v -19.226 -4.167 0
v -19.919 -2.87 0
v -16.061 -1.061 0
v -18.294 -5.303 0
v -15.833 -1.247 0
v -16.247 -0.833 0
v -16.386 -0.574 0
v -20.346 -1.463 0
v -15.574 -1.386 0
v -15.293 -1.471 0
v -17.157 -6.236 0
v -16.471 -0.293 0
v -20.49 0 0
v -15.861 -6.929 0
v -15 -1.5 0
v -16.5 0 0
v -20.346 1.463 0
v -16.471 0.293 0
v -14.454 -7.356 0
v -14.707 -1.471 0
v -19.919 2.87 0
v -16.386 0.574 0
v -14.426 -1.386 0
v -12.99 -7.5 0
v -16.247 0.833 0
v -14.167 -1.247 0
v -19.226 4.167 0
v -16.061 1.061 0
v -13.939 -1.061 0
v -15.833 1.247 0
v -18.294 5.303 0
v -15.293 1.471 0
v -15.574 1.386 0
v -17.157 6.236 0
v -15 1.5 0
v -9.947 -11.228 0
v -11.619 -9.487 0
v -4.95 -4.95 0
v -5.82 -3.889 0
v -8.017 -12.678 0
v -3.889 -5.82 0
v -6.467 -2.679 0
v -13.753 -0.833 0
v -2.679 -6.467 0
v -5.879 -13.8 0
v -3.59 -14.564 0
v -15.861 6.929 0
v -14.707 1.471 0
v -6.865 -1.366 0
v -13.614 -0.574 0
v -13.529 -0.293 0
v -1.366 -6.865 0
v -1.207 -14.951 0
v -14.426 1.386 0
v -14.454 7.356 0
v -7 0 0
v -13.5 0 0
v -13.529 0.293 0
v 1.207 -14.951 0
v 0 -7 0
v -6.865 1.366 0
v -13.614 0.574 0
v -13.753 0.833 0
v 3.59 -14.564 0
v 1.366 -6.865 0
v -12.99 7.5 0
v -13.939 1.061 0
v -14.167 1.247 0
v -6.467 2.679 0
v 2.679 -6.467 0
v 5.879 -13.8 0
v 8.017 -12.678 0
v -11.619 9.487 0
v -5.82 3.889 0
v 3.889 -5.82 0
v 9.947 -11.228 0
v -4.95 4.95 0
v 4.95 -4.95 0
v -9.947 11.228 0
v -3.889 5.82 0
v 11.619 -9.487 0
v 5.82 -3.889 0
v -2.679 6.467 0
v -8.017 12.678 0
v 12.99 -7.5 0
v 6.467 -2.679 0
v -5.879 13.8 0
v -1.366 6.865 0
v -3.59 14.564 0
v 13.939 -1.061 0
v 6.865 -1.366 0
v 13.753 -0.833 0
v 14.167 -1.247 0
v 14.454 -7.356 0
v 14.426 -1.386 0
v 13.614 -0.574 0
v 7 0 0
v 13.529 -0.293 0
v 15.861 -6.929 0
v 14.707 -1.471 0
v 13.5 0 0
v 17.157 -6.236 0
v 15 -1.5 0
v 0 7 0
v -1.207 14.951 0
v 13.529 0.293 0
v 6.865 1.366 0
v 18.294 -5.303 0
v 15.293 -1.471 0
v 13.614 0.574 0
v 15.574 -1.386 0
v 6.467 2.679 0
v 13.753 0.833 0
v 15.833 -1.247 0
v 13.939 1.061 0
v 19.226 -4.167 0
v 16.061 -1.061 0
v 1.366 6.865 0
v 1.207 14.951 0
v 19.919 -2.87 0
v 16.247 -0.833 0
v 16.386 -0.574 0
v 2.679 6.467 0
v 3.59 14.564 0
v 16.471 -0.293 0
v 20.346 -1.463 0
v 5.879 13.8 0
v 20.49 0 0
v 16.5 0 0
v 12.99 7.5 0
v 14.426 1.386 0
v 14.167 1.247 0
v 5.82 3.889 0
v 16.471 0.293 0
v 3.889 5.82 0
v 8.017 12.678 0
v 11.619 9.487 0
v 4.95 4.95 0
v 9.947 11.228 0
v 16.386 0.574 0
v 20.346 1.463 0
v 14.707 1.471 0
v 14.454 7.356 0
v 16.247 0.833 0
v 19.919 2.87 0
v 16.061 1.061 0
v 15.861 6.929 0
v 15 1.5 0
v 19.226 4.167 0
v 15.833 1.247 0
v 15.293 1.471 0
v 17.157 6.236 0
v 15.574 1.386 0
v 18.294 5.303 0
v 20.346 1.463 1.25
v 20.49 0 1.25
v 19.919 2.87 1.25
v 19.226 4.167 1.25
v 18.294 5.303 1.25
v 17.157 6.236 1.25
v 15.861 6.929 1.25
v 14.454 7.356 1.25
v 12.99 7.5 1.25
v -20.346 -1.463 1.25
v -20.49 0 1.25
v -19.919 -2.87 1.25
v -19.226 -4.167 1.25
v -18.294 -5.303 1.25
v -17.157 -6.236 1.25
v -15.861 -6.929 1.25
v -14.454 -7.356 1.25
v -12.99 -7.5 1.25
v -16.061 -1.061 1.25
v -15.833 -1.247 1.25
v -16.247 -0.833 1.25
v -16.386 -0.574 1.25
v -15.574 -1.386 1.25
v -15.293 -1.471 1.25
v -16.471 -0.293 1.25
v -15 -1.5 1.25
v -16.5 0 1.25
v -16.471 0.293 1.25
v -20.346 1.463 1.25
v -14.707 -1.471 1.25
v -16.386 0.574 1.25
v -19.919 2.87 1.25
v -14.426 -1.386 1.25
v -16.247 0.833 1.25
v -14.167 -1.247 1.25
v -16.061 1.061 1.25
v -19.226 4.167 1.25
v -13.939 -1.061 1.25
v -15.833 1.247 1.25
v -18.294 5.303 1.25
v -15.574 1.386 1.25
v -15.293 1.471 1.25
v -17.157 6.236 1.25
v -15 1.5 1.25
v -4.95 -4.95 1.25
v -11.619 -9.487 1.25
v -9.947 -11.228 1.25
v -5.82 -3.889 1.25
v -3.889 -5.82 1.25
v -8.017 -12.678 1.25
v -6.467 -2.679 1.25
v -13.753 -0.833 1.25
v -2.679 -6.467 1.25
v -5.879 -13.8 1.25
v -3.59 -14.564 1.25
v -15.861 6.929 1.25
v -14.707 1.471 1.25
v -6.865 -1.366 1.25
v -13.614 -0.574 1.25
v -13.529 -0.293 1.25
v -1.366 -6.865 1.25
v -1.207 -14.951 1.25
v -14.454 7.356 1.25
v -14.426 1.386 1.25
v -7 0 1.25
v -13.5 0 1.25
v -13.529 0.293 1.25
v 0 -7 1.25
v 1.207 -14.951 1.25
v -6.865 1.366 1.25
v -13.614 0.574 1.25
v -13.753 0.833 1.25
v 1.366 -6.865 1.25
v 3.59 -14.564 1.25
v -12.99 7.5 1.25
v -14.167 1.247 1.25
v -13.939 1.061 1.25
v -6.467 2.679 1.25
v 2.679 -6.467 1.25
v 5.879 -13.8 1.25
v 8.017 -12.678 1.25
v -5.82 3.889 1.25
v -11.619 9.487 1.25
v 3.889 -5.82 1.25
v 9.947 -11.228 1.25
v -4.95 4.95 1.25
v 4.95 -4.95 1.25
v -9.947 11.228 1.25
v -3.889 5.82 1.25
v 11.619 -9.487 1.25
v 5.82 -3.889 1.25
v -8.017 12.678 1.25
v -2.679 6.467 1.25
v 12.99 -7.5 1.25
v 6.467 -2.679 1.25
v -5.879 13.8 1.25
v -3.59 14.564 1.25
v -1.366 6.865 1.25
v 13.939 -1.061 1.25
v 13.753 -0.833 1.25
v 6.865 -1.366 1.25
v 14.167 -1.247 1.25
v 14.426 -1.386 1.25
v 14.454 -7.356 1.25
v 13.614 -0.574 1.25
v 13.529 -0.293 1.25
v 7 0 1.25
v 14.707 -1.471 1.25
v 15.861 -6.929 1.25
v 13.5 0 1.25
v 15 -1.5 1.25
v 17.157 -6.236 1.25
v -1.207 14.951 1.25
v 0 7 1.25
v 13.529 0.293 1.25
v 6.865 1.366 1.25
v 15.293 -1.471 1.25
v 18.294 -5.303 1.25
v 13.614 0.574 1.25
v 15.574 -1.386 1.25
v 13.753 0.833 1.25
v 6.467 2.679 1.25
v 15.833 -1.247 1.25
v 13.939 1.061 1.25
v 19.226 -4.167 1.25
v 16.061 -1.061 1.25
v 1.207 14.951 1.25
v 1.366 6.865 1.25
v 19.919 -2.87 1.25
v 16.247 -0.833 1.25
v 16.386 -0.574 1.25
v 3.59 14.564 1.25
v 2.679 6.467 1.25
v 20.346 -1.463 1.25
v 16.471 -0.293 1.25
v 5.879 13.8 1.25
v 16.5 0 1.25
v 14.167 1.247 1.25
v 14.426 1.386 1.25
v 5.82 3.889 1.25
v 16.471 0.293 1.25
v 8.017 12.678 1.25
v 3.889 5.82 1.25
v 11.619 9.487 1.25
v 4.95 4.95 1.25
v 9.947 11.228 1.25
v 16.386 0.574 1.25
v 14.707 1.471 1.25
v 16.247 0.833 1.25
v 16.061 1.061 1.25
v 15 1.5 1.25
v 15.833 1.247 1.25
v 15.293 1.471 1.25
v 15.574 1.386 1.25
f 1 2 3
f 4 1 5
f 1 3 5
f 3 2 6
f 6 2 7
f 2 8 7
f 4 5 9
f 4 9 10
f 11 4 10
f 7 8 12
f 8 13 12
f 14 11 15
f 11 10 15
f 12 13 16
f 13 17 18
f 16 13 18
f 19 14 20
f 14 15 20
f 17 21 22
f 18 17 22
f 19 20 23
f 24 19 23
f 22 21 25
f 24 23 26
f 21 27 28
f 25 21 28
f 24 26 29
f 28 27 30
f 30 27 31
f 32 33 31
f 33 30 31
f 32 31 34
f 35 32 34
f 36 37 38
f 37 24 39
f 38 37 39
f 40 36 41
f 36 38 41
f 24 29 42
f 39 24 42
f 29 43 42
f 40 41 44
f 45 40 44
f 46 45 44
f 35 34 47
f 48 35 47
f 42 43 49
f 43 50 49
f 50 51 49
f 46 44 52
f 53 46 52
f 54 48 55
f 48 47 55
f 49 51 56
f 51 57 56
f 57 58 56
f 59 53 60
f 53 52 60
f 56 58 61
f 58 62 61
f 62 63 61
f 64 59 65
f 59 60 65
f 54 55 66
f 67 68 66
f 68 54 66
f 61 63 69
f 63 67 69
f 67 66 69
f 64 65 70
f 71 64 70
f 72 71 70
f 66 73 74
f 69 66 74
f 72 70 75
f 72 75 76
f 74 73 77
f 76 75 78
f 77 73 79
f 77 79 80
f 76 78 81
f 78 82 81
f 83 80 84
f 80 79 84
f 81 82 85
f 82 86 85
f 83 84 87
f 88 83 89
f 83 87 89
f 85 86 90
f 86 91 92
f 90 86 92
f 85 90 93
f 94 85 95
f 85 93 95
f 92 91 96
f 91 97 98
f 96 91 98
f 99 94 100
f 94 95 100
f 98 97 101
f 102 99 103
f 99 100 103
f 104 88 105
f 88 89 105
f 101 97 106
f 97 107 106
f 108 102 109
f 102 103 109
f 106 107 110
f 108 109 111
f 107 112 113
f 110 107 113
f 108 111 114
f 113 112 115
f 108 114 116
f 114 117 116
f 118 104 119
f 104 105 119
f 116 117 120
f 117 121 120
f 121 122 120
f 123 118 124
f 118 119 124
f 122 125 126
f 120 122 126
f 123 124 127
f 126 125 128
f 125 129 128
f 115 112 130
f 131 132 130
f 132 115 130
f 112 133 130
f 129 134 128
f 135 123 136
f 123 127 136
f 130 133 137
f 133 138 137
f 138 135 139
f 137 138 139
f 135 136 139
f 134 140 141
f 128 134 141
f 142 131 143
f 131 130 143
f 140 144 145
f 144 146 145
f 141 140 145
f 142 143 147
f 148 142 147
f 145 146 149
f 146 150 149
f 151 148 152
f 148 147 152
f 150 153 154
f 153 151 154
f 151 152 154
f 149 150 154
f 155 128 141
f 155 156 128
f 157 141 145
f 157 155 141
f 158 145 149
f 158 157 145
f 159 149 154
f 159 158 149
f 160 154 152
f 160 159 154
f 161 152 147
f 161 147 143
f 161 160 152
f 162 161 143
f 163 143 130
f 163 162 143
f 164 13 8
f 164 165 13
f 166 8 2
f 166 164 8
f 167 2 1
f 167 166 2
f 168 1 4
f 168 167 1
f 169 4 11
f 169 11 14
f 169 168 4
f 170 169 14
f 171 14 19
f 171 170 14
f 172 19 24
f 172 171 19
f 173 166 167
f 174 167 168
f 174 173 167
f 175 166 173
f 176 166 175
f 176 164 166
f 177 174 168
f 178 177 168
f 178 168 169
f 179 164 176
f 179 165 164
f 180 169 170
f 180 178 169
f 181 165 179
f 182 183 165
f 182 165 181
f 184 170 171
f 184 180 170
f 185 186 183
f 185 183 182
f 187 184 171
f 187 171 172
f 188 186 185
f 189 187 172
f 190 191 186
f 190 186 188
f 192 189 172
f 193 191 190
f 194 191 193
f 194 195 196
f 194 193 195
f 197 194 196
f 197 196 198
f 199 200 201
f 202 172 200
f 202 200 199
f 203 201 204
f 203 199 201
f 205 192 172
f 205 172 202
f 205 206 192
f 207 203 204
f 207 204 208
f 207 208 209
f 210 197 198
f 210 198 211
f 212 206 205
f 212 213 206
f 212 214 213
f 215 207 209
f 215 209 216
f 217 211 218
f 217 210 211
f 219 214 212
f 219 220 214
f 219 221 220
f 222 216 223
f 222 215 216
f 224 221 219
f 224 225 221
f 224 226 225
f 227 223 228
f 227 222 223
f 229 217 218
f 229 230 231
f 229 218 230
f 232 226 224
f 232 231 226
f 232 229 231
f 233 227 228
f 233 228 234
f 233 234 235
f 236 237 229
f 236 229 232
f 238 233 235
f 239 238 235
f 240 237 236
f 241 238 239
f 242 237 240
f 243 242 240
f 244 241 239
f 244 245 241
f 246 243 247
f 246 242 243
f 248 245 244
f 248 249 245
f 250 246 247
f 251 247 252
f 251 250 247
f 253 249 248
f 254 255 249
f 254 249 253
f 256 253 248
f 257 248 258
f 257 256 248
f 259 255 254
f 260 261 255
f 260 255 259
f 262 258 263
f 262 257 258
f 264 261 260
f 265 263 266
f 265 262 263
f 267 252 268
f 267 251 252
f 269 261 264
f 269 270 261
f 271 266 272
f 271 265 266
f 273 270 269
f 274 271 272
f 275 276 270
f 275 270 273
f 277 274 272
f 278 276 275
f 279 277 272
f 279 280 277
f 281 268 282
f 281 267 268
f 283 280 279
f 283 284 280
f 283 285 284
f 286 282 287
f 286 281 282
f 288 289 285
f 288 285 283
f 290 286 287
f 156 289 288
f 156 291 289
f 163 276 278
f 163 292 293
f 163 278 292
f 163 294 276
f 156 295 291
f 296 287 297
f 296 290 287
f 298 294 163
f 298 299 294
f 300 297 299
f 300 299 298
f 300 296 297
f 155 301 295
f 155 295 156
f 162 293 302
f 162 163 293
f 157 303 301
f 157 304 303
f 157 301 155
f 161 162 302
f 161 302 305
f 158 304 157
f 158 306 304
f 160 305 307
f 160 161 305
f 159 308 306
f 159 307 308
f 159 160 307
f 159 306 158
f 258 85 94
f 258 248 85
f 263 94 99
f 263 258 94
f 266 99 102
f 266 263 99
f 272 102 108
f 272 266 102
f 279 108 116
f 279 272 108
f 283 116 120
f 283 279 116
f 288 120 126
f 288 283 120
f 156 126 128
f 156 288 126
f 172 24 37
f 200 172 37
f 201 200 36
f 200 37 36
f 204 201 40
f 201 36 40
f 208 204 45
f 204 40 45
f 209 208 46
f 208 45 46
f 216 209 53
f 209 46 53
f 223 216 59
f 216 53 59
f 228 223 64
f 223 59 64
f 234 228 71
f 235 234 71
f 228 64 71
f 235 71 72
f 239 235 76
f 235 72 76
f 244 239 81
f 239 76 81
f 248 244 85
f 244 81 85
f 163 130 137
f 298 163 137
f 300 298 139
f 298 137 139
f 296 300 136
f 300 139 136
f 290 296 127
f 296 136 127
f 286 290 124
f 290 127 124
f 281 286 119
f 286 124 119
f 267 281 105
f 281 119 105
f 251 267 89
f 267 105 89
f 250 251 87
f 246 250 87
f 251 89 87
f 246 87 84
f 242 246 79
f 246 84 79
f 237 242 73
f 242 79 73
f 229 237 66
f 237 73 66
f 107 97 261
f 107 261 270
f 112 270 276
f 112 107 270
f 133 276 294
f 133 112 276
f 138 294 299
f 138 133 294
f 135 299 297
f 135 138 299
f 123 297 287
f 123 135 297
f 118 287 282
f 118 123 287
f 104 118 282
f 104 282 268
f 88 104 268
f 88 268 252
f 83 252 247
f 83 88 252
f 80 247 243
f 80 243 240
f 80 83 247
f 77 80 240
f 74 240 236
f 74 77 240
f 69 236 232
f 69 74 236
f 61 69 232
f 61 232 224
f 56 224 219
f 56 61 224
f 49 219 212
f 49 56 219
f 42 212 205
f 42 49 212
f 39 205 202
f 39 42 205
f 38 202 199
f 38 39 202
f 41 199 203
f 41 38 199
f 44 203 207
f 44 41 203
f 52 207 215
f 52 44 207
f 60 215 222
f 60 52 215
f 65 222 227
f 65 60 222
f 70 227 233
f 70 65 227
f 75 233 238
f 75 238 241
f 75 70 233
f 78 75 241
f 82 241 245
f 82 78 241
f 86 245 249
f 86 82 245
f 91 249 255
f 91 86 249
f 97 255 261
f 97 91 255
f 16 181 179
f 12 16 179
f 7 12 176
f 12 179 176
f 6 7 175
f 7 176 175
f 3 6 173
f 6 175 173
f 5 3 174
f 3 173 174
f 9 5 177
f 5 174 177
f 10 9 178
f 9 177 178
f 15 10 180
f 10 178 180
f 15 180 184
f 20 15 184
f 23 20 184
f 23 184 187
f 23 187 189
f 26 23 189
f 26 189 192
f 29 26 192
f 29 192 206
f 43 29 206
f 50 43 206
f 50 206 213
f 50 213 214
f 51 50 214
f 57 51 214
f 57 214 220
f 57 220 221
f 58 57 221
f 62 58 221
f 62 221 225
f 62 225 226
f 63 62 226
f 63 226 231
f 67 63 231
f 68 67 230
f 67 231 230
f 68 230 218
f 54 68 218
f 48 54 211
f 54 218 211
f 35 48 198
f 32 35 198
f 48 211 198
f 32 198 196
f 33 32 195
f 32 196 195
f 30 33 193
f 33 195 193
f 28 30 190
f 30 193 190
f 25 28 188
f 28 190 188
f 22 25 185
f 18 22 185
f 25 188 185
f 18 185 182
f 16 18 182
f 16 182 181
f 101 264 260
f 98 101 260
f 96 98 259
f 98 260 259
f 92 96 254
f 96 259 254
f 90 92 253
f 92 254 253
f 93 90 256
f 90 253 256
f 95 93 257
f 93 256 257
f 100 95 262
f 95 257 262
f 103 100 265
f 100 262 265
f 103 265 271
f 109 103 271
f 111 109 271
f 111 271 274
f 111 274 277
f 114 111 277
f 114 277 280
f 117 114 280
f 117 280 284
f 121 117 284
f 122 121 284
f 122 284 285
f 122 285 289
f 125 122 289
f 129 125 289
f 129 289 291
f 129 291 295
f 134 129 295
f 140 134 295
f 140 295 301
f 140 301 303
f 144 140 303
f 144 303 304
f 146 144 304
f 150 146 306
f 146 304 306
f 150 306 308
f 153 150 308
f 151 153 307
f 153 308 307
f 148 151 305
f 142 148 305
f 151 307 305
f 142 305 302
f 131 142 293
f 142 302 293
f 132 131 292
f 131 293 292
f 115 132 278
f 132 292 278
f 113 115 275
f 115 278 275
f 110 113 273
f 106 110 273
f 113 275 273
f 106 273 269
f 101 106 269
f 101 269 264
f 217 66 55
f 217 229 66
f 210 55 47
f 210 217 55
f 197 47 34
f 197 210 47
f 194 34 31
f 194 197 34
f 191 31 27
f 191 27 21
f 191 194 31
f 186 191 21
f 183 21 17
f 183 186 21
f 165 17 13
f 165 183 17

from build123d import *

# Parameters (mm, degrees)
F0_R     = 7
F1_DEPTH = 1.25
F2_R     = 7.49999
F3_D     = 3


# Not quite as in the source:
# - a fillet or chamfer is up to 0.001 mm smaller than in the source, because OpenCascade refuses the exact size


with BuildPart() as f1:
    # F0 (on Top) → F1 (new body)
    with BuildSketch(Plane.XY):
        with BuildLine():
            ThreePointArc((-12.990381, -7.5), (-15, 0), (-12.990381, 7.5))
            Line((-12.990381, 7.5), (-20.490381, 7.5))
            Line((-20.490381, 7.5), (-20.490381, -7.5))
            Line((-20.490381, -7.5), (-12.990381, -7.5))
        make_face()
        with BuildLine():
            ThreePointArc((12.990381, -7.5), (14.488887, -3.882286), (15, 0))
            ThreePointArc((15, 0), (14.488887, 3.882286), (12.990381, 7.5))
            ThreePointArc((12.990381, 7.5), (0, 15), (-12.990381, 7.5))
            ThreePointArc((-12.990381, 7.5), (-15, 0), (-12.990381, -7.5))
            ThreePointArc((-12.990381, -7.5), (0, -15), (12.990381, -7.5))
        make_face()
        Circle(F0_R, mode=Mode.SUBTRACT)
        with BuildLine():
            ThreePointArc((12.990381, 7.5), (14.488887, 3.882286), (15, 0))
            ThreePointArc((15, 0), (14.488887, -3.882286), (12.990381, -7.5))
            Line((12.990381, -7.5), (20.490381, -7.5))
            Line((20.490381, -7.5), (20.490381, 7.5))
            Line((20.490381, 7.5), (12.990381, 7.5))
        make_face()
    extrude(amount=F1_DEPTH)

    # F2 (radius 7.5 in the source; OpenCascade refuses exactly that, so slightly less here)
    f2_edges = [f1.edges().sort_by_distance(p)[0] for p in [
        (-20.490381, 7.5, 0.625),
        (-20.490381, -7.5, 0.625),
        (20.490381, 7.5, 0.625),
        (20.490381, -7.5, 0.625),
    ]]
    fillet(f2_edges, radius=F2_R)

    # F3 (through all)
    with Locations(Plane(origin=(0, 0, 0), x_dir=(1, 0, 0), z_dir=(0, 0, -1))):
        with Locations((15, 0), (-15, 0)):
            Hole(F3_D / 2)


solid = f1.part
